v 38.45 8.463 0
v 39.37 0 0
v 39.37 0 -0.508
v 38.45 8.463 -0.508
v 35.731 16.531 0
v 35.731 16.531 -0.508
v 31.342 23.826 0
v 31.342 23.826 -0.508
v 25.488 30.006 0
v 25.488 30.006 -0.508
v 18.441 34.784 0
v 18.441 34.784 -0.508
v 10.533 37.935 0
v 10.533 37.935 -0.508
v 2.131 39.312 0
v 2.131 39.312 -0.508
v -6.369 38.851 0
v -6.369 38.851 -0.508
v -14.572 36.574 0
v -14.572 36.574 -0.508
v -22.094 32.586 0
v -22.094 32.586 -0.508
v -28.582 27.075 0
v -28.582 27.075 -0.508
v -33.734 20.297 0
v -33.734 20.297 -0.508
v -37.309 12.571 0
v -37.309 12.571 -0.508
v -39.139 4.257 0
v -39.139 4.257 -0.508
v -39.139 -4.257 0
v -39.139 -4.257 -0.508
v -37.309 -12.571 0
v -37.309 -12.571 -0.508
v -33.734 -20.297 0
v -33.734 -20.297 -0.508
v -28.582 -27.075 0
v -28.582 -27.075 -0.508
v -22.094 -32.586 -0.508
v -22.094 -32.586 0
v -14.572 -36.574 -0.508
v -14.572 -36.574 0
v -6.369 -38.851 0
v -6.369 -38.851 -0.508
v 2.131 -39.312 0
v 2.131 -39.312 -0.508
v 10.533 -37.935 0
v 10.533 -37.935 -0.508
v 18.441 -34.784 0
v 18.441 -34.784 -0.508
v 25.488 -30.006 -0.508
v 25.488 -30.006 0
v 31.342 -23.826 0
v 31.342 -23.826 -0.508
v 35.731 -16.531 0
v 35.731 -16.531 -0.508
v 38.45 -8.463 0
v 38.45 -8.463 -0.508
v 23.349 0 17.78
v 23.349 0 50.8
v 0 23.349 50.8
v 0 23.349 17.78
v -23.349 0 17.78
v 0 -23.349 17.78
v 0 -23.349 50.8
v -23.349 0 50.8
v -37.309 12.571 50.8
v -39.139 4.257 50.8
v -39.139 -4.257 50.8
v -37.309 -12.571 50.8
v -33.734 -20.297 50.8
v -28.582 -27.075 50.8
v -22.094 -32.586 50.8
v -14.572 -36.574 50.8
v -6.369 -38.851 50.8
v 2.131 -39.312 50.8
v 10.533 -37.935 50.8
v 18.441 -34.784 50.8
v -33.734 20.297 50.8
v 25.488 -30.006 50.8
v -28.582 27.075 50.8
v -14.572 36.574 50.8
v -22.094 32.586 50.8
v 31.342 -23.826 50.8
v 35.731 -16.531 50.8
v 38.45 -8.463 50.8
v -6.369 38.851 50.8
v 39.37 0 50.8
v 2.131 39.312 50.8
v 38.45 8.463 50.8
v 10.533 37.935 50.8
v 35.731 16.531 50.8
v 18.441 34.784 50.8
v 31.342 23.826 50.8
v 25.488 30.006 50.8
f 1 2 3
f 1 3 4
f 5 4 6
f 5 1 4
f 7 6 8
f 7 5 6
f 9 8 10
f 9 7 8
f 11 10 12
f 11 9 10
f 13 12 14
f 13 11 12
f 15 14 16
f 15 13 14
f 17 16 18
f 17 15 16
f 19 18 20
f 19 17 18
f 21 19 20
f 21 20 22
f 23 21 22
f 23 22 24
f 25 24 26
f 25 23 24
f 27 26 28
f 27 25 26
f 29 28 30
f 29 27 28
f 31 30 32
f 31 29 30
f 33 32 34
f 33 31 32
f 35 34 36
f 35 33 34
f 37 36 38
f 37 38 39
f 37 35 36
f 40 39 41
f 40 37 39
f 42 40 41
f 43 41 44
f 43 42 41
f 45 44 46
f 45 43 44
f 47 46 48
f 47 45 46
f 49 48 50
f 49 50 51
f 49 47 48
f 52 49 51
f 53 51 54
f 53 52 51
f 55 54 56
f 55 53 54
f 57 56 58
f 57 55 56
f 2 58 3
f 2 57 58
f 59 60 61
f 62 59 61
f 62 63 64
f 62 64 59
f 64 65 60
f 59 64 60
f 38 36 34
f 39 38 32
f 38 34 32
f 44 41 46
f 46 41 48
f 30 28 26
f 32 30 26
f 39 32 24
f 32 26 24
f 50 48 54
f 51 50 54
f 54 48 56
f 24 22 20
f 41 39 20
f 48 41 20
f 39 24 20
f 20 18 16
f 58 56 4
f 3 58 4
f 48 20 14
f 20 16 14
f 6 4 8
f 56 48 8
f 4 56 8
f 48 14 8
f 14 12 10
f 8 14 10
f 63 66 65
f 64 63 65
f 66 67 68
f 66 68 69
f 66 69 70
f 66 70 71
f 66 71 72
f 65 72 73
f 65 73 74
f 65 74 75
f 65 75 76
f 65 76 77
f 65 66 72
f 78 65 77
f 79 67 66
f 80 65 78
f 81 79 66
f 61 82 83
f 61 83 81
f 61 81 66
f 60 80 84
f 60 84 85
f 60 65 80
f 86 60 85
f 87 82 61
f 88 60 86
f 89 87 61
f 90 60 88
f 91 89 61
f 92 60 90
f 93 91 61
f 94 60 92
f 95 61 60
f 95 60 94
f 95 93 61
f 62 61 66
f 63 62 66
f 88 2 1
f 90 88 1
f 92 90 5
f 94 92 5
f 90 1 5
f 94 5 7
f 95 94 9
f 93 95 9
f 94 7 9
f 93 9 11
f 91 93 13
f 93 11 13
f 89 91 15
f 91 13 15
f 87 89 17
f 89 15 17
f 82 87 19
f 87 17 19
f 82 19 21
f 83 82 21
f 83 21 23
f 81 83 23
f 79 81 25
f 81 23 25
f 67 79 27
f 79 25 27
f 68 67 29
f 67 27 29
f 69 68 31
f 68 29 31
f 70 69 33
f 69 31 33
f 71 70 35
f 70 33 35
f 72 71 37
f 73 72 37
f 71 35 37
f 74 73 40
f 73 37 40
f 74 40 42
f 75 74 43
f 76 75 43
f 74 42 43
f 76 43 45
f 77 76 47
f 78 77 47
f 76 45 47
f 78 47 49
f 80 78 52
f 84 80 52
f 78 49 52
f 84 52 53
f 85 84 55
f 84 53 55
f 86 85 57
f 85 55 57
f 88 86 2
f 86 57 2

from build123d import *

# Parameters (mm, degrees)
F0_R     = 39.37
F1_DEPTH = 0.508
F2_R     = 39.37
F3_DEPTH = 50.8
F5_DEPTH = 33.02


with BuildPart() as f1:
    # F0 (on Top) → F1 (new body)
    with BuildSketch(Plane.XY):
        Circle(F0_R)
    extrude(amount=-F1_DEPTH)

    # F2 (on Top) → F3 (join)
    with BuildSketch(Plane.XY):
        Circle(F2_R)
    extrude(amount=F3_DEPTH)

    # F4 (on face) → F5 (cut)
    with BuildSketch(Plane.XY.offset(50.8)):
        Polygon((23.348666, 0), (0, 23.348666), (-23.348666, 0), (0, -23.348666), align=None)
    extrude(amount=-F5_DEPTH, mode=Mode.SUBTRACT)


solid = f1.part
